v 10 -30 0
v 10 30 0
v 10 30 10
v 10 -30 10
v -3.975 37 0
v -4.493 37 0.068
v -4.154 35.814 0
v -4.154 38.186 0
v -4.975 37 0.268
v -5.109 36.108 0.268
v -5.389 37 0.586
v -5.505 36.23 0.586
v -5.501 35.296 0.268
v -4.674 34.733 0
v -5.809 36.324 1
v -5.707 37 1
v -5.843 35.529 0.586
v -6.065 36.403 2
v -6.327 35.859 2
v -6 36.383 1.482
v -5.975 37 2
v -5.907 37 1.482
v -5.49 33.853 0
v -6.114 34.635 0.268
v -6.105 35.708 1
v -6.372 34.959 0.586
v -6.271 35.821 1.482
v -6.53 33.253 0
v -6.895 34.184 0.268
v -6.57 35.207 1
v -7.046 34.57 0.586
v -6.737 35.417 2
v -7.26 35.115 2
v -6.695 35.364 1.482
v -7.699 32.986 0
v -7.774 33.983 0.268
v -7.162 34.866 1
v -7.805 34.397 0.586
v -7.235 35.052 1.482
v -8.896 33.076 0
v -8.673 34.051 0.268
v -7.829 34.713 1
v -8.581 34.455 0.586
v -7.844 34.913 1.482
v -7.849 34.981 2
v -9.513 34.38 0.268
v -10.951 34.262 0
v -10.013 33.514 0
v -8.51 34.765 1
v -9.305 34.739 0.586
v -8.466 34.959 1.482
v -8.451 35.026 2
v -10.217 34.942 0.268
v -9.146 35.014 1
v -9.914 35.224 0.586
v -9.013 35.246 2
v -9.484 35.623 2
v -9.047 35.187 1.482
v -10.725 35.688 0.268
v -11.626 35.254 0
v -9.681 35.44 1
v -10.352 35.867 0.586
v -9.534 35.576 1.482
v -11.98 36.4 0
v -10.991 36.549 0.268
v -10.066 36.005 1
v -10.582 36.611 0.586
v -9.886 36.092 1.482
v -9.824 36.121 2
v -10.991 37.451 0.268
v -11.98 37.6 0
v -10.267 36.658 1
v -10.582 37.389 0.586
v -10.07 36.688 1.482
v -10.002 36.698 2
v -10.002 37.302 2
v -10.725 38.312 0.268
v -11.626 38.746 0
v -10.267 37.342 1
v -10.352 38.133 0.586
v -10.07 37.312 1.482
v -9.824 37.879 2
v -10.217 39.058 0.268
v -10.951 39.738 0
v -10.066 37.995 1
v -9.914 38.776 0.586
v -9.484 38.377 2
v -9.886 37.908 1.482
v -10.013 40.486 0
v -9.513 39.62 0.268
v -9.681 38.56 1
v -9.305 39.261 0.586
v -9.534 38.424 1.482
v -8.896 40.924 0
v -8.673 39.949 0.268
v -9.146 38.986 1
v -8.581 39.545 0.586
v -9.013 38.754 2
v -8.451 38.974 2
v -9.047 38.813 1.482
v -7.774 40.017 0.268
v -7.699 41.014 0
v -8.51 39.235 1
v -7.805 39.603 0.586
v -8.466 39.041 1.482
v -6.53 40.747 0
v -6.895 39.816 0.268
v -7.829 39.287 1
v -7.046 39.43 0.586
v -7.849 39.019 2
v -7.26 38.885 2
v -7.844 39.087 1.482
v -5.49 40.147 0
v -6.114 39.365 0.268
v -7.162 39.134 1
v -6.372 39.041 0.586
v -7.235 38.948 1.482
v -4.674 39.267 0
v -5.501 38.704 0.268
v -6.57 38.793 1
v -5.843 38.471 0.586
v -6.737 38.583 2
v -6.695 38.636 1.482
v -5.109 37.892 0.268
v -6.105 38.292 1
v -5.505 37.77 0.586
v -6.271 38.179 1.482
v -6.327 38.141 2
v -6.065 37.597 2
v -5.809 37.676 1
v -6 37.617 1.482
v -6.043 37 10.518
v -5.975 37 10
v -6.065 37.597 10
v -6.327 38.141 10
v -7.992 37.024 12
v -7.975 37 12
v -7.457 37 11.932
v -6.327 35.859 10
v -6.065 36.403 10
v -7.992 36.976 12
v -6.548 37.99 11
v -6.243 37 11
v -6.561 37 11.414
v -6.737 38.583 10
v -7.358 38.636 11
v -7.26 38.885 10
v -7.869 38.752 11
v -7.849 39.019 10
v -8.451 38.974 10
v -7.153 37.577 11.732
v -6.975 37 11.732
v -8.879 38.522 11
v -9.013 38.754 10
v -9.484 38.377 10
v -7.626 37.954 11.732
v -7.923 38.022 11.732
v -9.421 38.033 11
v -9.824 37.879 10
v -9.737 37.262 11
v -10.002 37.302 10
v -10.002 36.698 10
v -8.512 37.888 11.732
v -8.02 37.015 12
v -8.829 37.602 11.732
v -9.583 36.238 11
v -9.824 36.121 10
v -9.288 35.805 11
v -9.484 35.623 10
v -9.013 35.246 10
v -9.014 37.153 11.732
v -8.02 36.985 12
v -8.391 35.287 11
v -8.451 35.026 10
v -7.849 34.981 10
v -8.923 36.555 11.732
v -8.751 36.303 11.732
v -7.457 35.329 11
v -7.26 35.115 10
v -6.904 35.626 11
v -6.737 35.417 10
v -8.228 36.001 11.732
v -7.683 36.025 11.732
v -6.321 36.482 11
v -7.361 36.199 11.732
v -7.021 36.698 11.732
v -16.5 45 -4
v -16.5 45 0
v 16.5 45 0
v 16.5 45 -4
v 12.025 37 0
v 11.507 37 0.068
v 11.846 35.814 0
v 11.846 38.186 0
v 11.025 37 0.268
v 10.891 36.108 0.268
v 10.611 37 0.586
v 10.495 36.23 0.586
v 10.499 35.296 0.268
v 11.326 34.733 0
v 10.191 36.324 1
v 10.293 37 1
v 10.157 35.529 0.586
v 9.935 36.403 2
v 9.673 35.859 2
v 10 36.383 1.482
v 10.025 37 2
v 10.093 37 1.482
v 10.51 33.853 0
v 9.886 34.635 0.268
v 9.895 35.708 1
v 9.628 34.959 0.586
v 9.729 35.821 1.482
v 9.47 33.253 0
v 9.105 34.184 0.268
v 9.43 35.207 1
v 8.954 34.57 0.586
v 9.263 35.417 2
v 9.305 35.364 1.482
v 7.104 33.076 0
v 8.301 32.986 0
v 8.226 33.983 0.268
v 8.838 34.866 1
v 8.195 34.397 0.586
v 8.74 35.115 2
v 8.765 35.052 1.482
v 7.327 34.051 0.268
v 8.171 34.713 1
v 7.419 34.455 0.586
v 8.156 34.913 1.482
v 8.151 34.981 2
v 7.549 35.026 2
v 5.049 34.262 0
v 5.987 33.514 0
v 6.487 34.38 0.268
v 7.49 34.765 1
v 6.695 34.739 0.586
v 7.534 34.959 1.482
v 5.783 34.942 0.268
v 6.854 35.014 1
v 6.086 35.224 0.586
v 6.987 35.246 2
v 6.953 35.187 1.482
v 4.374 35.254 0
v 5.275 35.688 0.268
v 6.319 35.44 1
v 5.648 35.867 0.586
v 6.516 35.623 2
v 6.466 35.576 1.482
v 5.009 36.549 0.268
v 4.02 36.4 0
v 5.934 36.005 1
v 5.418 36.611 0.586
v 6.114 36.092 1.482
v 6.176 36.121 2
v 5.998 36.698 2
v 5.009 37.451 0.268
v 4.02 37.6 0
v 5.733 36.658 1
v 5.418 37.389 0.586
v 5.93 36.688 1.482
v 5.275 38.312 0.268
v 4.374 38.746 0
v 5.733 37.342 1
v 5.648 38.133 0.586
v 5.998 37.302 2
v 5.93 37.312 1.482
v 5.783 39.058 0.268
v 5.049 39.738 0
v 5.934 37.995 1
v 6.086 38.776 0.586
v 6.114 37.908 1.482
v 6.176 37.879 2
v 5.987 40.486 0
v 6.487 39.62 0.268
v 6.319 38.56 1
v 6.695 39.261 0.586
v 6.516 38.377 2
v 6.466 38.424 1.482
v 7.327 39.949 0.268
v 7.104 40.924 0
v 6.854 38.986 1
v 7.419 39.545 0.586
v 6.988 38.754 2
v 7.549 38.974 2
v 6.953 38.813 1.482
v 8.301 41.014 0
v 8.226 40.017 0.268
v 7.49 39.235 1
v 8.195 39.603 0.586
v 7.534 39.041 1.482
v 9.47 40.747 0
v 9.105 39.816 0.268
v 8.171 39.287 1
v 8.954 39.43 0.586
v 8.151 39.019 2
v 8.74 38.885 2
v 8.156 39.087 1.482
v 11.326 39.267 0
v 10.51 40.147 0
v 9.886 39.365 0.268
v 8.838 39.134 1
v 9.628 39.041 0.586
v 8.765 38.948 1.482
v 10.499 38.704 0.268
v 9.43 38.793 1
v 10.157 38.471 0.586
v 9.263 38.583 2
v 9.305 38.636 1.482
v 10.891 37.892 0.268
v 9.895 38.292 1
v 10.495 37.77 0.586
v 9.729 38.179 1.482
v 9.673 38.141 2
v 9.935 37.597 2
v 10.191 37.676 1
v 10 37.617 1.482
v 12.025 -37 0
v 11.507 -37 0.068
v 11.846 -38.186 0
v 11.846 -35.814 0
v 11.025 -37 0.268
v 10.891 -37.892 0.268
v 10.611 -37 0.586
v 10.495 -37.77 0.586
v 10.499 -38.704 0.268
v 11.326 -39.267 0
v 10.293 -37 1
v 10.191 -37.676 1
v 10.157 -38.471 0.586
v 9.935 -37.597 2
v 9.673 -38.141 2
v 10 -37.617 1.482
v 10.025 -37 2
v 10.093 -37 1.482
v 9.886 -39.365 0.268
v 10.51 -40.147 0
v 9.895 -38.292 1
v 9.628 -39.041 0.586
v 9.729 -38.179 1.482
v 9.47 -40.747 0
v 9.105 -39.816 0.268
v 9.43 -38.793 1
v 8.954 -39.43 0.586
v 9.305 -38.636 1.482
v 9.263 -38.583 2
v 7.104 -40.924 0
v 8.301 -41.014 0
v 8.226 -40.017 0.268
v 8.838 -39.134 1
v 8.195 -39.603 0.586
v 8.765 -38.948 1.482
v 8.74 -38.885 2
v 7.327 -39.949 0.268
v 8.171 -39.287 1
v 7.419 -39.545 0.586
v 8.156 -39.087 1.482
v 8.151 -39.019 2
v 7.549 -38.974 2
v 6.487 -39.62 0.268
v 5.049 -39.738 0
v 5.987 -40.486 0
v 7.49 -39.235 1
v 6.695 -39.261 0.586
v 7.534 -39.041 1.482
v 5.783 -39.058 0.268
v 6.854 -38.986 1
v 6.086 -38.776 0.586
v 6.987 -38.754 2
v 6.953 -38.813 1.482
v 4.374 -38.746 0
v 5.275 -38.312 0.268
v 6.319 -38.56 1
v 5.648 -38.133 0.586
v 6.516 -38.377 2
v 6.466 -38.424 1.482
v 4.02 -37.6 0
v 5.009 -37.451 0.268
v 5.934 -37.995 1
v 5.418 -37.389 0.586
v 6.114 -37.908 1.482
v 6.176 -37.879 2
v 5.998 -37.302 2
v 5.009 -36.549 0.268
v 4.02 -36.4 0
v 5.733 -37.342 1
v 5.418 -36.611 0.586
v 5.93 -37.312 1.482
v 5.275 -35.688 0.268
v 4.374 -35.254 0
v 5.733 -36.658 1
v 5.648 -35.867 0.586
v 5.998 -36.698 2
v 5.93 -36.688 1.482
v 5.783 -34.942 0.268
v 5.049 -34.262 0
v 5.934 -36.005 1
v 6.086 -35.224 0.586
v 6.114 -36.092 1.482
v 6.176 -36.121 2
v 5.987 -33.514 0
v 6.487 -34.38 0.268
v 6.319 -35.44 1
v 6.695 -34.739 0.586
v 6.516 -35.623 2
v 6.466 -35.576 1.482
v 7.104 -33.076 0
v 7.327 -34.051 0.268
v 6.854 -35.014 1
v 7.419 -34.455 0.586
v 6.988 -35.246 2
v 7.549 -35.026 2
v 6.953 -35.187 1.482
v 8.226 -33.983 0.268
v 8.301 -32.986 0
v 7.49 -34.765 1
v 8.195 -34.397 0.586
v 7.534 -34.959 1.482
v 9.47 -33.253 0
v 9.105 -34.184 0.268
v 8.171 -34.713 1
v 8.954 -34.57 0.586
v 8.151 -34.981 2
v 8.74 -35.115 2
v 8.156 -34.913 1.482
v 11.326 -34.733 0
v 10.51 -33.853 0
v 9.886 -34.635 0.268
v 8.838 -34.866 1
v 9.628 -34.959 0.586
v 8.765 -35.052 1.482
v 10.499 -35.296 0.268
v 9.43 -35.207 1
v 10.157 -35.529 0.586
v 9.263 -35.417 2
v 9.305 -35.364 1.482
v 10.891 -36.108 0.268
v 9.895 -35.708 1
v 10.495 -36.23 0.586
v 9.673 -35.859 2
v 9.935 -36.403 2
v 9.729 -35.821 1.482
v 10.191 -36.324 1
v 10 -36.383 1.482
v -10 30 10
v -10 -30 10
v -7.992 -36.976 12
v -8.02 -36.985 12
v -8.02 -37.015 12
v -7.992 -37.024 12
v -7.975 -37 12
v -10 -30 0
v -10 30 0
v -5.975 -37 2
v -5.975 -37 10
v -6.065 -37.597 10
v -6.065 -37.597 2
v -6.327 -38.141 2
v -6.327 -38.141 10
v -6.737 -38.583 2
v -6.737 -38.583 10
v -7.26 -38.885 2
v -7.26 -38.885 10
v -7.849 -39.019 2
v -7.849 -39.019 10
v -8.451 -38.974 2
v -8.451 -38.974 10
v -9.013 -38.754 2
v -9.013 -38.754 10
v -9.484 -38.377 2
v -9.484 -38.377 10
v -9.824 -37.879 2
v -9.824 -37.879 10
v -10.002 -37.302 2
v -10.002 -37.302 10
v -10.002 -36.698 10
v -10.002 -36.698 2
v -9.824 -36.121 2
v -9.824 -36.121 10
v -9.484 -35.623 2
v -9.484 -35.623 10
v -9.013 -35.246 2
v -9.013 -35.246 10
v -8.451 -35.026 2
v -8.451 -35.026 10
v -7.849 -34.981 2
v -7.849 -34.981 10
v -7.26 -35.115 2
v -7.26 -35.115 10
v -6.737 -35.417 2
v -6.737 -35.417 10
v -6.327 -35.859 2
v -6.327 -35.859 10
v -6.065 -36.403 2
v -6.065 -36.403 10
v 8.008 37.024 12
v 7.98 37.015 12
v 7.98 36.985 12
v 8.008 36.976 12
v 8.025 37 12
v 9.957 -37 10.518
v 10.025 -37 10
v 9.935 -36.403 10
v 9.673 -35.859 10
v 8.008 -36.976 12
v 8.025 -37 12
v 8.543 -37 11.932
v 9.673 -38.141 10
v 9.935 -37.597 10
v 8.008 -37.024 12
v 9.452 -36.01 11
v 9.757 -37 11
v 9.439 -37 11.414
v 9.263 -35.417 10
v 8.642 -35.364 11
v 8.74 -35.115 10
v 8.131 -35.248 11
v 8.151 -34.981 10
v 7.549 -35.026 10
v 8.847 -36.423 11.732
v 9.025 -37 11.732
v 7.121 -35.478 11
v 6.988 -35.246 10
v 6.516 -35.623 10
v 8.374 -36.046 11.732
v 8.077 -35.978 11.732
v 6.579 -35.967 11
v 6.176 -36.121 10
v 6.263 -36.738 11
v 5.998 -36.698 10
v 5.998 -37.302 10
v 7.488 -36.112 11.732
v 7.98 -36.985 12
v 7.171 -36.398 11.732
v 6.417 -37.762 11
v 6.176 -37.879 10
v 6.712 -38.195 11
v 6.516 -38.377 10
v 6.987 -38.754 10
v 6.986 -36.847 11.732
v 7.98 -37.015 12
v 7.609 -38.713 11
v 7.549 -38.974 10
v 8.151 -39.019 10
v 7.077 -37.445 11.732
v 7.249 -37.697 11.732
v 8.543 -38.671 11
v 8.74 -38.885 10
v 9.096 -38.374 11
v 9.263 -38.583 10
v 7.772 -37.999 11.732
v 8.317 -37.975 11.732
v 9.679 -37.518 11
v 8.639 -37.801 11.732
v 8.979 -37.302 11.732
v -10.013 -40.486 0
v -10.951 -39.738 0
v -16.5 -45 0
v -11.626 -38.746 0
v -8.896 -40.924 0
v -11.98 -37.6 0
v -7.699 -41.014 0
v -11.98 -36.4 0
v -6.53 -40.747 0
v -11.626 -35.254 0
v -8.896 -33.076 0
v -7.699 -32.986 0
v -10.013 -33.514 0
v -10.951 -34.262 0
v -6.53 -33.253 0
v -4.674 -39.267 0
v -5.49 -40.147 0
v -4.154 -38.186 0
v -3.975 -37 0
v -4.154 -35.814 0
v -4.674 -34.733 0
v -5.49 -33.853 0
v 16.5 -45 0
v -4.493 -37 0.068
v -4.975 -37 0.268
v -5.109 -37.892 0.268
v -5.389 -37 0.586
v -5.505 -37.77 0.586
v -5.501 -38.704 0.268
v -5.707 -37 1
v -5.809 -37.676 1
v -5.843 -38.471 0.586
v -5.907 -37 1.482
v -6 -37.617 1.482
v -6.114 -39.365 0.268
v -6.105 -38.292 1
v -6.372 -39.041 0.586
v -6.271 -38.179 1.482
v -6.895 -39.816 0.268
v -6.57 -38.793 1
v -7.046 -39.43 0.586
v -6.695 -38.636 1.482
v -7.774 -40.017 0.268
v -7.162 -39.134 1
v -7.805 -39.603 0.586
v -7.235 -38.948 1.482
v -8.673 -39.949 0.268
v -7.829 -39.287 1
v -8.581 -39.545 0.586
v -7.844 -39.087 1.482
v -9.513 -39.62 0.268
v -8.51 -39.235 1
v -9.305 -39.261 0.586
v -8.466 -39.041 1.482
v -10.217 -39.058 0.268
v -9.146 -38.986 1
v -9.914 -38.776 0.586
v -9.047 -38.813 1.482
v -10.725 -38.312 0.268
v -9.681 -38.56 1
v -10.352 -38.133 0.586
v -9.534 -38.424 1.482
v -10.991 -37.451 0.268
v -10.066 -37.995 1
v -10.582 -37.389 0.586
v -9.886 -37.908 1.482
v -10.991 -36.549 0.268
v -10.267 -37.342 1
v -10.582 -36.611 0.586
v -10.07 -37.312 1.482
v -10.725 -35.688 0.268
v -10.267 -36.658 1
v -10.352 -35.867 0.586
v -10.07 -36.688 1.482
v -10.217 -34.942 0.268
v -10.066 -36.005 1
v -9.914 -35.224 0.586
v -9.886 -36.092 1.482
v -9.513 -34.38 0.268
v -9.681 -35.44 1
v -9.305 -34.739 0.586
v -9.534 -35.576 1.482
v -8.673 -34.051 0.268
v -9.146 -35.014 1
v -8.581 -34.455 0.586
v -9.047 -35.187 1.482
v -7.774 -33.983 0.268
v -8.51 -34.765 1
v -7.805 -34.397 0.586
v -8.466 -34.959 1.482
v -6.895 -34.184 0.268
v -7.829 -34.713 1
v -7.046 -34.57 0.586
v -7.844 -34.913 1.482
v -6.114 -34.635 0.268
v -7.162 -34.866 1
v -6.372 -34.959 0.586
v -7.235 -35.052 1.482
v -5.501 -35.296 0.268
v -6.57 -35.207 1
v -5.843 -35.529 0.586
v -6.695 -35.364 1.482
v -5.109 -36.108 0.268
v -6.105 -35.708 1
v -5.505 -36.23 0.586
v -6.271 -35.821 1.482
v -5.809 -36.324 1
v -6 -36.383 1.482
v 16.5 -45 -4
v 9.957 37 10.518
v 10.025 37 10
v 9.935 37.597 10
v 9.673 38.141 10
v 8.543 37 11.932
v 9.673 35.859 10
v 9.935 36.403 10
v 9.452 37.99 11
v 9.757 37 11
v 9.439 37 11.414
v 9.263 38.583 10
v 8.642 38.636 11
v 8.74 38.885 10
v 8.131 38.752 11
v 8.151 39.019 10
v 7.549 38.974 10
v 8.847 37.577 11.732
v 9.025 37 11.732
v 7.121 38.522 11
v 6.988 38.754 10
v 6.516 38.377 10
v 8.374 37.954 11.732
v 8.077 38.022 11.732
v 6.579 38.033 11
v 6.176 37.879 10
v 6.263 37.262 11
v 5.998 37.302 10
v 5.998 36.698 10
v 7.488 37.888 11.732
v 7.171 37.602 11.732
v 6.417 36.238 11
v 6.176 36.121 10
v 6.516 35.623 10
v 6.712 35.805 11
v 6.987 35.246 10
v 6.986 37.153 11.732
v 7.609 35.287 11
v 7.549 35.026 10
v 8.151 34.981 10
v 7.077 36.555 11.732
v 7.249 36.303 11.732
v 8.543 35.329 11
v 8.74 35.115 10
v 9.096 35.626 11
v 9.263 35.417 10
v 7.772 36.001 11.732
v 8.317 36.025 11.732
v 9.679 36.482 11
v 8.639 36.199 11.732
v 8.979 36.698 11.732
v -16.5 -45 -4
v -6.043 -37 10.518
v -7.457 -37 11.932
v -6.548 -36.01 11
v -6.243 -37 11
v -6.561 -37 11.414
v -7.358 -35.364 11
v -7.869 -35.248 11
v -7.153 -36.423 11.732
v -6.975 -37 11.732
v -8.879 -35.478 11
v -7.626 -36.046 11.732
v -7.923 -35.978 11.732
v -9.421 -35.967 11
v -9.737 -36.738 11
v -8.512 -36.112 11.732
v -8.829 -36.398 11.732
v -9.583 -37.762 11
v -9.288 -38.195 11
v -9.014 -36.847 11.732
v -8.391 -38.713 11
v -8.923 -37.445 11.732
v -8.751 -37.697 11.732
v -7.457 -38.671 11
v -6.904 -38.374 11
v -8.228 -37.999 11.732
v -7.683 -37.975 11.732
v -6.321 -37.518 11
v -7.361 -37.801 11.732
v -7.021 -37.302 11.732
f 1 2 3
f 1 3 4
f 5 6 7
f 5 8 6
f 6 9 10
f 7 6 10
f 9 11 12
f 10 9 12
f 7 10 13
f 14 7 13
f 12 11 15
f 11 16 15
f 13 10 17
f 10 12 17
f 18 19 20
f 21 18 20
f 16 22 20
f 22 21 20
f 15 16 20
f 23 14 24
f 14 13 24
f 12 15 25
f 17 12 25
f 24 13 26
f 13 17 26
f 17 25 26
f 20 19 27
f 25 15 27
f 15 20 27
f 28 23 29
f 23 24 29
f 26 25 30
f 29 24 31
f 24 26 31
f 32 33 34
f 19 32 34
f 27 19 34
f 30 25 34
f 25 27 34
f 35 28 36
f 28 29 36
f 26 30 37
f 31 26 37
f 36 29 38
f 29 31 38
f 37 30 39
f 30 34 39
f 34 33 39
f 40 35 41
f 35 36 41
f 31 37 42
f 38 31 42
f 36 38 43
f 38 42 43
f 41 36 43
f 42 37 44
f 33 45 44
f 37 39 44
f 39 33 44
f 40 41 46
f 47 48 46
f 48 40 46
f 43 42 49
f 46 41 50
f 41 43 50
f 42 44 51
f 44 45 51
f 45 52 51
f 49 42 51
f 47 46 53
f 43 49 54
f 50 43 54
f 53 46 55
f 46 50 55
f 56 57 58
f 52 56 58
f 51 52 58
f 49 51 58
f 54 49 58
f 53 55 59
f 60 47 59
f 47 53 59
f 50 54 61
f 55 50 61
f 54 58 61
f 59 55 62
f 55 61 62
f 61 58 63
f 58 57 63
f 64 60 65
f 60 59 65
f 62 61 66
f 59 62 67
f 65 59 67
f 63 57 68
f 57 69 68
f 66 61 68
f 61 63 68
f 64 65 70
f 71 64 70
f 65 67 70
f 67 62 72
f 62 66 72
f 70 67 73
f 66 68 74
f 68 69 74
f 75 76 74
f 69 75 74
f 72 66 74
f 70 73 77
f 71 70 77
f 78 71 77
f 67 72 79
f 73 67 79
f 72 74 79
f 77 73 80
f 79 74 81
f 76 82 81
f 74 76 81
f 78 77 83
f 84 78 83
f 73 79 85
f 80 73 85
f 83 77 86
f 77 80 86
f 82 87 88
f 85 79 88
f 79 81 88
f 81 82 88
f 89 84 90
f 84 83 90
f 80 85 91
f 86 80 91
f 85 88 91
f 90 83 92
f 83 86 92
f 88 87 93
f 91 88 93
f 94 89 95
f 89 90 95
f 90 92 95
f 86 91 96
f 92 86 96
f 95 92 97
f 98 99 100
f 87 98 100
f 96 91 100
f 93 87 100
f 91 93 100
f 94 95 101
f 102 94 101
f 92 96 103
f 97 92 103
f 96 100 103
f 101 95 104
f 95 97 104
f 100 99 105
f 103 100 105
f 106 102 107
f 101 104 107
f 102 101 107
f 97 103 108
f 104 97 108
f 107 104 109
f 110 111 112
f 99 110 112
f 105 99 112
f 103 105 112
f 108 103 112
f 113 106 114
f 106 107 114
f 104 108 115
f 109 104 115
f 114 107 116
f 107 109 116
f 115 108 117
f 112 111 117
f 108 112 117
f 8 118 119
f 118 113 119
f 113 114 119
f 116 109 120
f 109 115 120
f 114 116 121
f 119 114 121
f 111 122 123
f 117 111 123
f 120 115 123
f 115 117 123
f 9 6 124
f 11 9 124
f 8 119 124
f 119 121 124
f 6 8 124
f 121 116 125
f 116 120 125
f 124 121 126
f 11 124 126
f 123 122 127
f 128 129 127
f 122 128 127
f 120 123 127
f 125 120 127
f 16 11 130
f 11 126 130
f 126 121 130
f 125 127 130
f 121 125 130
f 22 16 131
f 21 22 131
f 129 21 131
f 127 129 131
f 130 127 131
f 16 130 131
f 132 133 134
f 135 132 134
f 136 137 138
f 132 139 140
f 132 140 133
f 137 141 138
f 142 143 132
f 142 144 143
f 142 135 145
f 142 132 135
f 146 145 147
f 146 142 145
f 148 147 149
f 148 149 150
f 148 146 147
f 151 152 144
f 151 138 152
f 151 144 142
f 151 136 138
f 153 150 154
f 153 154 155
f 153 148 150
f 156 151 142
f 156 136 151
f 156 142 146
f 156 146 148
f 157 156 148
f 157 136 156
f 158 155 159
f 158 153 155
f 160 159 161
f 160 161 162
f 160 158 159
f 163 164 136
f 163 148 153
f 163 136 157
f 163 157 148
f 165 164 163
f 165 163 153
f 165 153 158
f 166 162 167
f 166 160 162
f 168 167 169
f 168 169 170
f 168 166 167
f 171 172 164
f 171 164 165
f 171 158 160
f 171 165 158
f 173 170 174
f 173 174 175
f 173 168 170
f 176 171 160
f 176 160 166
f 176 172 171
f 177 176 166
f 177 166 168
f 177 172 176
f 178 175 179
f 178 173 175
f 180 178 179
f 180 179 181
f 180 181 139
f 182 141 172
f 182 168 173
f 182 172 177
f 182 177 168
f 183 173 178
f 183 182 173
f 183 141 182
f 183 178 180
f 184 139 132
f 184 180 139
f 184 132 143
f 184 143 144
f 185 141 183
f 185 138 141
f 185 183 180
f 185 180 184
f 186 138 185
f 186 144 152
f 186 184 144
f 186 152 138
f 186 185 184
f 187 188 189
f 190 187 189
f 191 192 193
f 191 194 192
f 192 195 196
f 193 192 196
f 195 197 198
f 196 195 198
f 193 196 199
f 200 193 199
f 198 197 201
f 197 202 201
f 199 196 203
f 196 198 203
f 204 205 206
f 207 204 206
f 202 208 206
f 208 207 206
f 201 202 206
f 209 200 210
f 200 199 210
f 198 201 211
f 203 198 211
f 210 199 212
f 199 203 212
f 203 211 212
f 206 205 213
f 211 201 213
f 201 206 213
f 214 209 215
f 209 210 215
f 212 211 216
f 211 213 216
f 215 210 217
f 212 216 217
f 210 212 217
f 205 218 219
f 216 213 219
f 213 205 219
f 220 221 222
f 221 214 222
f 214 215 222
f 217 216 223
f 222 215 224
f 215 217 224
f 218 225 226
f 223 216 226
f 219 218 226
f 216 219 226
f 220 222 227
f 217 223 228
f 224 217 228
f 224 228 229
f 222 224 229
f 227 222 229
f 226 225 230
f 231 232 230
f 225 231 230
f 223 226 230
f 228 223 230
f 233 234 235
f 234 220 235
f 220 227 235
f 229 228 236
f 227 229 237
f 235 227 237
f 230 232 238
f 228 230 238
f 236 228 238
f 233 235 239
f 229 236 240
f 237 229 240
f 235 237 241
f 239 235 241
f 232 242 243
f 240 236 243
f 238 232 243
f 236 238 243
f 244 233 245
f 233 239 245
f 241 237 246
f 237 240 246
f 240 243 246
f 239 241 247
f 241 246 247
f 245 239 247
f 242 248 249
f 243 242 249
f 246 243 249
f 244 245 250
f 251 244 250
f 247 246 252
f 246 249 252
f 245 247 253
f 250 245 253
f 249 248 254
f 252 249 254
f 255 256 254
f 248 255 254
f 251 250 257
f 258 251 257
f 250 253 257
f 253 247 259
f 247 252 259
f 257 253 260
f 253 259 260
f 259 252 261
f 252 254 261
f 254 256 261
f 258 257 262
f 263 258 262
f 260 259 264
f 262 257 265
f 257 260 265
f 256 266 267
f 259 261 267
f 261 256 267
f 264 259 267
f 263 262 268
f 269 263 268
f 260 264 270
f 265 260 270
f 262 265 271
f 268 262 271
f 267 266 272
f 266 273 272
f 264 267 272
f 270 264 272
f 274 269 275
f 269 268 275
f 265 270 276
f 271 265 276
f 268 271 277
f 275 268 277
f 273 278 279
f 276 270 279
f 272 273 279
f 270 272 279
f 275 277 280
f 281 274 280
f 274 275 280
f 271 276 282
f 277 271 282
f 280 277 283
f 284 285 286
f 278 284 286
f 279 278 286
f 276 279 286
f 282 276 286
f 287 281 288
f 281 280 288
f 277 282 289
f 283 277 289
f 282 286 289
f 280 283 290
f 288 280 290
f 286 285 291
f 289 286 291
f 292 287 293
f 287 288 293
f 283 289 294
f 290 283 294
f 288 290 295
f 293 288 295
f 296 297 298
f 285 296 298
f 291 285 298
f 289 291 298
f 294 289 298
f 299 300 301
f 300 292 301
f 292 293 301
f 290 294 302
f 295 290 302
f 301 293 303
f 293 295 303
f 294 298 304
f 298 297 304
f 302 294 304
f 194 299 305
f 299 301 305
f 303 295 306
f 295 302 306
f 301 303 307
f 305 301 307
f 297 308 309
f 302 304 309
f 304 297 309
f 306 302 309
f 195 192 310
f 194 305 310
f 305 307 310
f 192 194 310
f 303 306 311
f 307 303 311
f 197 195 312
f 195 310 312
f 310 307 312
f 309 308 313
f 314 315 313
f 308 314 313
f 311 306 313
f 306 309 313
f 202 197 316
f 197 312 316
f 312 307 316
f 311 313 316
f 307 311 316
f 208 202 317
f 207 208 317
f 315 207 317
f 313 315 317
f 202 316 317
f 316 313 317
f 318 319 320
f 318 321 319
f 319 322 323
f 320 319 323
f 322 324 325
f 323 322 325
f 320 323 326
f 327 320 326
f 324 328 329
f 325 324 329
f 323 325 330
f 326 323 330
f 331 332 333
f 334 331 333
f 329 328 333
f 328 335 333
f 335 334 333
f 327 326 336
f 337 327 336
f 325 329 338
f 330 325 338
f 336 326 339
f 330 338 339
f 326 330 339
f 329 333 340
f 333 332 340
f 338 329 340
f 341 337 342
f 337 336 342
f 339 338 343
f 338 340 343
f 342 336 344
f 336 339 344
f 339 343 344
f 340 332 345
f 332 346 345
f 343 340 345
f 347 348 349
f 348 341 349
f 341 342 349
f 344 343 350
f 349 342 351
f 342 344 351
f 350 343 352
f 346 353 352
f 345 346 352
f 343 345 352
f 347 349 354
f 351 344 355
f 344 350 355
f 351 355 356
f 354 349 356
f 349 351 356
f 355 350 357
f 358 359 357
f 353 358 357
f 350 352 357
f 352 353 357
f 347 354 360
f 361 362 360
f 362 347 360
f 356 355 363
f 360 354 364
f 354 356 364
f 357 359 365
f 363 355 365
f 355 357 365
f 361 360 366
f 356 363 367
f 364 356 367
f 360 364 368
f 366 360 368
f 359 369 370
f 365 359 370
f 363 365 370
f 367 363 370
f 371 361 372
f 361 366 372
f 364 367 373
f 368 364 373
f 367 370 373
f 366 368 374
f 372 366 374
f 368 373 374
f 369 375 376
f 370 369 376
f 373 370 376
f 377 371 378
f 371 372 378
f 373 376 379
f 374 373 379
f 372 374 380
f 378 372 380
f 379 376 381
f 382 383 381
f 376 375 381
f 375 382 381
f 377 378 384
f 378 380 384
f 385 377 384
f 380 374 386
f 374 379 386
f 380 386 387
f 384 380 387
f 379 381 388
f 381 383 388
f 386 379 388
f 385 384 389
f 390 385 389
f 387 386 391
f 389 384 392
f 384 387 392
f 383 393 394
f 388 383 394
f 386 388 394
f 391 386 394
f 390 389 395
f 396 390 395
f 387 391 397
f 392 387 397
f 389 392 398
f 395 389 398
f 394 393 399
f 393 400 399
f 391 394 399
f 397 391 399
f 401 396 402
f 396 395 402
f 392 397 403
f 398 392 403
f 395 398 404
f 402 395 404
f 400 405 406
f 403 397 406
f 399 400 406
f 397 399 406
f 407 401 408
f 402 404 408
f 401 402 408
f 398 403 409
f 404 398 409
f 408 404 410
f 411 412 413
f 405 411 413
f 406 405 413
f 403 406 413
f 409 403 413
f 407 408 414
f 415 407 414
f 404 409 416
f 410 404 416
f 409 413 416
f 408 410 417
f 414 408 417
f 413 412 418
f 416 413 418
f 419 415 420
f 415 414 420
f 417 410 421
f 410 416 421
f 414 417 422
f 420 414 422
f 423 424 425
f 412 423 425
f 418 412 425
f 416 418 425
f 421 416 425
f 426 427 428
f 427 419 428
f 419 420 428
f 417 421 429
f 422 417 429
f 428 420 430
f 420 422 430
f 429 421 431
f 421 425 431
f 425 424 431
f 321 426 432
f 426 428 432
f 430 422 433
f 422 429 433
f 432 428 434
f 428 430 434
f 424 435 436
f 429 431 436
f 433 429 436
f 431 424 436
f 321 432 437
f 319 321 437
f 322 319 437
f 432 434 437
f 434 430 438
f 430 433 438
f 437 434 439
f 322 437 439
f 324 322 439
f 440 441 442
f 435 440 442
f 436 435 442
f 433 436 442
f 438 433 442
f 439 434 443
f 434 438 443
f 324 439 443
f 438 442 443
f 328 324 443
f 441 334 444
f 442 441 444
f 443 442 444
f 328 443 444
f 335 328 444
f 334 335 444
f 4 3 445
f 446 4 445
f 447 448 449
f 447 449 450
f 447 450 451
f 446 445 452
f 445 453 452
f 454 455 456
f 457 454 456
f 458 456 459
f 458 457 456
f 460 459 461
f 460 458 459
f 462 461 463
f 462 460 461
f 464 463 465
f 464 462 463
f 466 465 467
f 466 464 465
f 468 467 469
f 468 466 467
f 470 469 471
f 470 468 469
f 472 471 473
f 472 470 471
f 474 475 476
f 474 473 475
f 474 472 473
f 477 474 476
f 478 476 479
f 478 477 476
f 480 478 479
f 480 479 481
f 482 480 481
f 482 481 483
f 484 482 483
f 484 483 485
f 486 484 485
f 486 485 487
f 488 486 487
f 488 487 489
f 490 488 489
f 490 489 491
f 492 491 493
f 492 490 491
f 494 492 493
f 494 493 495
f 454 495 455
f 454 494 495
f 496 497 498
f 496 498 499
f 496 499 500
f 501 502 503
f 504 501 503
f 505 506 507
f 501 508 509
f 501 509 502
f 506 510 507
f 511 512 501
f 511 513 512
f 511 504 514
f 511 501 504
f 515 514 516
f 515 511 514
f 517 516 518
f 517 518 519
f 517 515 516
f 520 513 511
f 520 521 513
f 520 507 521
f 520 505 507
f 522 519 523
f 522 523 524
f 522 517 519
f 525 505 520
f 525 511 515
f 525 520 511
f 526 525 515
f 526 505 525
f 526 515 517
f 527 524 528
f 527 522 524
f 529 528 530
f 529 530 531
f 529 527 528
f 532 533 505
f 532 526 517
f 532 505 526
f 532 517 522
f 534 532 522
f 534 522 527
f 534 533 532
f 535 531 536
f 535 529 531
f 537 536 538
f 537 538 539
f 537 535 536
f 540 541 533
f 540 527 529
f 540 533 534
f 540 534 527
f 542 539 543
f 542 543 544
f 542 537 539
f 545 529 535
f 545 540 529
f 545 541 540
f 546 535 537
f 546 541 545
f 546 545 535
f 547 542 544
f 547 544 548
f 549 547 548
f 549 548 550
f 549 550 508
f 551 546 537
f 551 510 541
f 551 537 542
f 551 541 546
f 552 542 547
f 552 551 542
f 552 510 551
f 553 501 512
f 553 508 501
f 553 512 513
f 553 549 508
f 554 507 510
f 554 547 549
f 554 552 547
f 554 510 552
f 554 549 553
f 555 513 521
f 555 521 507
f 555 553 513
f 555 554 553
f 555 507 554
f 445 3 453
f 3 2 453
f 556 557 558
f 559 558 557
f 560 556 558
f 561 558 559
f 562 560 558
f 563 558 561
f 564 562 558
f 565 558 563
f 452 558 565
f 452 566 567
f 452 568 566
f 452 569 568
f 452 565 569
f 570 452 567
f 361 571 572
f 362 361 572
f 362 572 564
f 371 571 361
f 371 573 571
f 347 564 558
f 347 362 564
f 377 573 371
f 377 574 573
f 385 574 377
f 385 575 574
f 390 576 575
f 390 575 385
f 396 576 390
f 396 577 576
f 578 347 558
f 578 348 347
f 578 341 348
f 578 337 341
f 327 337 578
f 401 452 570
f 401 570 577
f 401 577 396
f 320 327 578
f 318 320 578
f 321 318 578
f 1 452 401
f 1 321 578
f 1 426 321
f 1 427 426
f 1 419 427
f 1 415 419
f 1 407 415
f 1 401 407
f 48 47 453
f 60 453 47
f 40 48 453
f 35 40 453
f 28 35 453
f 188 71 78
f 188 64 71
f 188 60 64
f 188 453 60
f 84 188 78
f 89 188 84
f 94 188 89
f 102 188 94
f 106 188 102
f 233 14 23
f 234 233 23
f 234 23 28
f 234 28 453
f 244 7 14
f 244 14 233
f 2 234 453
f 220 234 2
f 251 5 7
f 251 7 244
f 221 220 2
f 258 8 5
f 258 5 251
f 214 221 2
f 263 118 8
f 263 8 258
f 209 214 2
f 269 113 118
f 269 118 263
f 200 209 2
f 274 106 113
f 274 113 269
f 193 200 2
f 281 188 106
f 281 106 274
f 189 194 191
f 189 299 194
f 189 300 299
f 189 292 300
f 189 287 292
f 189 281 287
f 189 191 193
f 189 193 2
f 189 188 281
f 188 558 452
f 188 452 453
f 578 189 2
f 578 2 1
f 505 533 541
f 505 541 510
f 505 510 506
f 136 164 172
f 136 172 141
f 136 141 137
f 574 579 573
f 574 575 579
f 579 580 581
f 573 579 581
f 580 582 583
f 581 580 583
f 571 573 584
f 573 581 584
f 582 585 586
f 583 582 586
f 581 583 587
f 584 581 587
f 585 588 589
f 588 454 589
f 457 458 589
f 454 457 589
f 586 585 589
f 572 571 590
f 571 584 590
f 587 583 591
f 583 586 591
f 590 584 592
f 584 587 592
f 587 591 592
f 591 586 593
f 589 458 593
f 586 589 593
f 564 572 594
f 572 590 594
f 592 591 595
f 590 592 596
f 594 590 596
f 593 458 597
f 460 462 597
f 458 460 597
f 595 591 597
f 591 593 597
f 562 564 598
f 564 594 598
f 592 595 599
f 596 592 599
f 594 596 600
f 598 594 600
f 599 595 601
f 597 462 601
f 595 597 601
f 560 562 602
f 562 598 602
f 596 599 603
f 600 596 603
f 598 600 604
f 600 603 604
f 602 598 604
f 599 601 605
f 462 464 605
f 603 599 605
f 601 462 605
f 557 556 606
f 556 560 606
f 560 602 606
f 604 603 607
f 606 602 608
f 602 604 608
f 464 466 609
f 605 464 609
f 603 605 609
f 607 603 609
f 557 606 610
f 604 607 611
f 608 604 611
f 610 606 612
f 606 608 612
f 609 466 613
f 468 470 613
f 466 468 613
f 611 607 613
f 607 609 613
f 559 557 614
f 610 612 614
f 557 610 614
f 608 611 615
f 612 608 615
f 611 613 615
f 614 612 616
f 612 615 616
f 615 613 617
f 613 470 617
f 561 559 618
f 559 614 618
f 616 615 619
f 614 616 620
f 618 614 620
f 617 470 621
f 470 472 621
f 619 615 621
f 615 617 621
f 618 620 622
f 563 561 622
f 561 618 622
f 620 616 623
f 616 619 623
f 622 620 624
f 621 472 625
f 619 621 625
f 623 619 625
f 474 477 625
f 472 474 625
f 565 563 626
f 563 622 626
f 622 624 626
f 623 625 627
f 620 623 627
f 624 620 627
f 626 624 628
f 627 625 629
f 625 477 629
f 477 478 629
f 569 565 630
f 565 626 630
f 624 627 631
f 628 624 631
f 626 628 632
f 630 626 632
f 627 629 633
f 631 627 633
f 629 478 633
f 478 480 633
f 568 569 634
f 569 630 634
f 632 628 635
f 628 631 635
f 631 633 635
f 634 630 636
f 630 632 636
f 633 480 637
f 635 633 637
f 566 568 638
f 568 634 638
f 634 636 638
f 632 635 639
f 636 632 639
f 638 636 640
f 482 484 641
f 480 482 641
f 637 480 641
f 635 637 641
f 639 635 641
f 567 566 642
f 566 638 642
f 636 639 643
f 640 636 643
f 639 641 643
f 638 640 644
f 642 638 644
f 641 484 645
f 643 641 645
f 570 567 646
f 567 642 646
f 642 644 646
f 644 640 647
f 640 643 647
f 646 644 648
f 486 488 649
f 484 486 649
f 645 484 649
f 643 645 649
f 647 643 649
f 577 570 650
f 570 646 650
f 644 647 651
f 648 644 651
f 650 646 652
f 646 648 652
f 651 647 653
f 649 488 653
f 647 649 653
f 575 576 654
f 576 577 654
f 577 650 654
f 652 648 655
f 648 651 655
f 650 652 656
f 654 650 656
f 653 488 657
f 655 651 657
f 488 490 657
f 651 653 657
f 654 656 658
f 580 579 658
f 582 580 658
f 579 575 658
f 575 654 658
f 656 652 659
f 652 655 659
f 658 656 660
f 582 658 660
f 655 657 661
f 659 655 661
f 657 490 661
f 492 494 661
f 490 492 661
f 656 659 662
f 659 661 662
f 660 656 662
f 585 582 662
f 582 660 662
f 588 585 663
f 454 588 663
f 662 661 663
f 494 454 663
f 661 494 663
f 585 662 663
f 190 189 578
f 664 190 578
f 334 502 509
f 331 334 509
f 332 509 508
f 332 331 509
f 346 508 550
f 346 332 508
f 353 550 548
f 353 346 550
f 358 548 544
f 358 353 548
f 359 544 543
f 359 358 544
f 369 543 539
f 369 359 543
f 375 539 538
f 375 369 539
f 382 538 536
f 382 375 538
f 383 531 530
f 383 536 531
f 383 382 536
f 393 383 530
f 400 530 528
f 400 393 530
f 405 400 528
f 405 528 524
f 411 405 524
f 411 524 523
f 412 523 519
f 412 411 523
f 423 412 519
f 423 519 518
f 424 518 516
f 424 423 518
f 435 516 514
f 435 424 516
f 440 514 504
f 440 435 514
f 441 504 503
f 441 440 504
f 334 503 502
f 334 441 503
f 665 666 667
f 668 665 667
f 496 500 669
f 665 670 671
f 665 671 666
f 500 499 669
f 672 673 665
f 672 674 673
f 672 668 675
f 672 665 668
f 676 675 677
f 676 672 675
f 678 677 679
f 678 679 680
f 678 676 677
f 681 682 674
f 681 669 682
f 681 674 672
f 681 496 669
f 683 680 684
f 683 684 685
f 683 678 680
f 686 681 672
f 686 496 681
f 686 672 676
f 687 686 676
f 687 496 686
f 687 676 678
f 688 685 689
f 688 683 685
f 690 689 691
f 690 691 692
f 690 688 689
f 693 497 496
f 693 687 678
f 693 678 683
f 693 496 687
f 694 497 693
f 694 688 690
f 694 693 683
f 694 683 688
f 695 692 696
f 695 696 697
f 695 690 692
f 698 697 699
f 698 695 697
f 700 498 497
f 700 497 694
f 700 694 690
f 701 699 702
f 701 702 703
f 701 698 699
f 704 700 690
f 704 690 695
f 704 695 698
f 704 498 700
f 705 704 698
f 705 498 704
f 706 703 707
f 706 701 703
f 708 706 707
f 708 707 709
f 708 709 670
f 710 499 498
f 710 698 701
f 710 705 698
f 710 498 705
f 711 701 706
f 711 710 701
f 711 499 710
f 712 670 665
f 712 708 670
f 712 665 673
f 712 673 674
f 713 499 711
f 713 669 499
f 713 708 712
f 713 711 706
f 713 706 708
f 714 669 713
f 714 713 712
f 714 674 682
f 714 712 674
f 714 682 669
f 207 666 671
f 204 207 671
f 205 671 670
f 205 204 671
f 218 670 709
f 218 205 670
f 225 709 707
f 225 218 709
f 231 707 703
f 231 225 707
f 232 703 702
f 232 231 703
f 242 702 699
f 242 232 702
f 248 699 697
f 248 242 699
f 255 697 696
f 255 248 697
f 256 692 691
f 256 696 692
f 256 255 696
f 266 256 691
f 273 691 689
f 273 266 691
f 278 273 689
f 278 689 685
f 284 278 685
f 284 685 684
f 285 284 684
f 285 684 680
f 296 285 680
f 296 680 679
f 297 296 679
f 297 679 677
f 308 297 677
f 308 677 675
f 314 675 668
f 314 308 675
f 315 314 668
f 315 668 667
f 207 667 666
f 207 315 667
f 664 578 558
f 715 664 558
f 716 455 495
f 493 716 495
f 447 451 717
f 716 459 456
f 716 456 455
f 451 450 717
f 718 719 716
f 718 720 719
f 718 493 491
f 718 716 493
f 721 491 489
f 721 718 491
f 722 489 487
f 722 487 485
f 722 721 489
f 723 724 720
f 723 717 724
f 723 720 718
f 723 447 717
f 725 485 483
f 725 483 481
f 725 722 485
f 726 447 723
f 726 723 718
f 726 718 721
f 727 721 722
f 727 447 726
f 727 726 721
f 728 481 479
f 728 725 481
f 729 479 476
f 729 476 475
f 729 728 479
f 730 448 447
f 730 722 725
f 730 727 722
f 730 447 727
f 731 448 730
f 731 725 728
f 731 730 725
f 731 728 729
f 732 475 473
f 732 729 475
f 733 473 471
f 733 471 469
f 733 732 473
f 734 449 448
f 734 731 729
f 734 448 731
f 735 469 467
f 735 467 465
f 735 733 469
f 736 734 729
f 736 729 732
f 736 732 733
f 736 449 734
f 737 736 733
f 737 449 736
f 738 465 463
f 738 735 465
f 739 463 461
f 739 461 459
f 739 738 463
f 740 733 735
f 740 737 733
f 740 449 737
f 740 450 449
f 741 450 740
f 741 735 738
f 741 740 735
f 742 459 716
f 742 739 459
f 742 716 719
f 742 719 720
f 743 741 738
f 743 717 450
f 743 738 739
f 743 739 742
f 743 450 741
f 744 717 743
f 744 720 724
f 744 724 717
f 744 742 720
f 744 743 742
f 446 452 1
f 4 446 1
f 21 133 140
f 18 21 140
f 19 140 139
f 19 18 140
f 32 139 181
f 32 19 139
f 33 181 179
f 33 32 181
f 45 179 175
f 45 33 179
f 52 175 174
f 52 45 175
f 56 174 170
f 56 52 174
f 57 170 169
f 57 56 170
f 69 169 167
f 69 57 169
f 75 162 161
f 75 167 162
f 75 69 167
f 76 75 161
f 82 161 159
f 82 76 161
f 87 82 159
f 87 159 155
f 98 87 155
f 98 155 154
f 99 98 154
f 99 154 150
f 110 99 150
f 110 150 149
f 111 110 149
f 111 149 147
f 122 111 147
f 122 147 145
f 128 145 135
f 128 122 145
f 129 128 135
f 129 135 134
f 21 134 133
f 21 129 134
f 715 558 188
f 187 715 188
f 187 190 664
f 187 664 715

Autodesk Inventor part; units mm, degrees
ref_plane "YZ Plane" through (0, 0, 0) normal (1, 0, 0) x (0, 1, 0)
ref_plane "XZ Plane" through (0, 0, 0) normal (0, 1, 0) x (-1, 0, 0)
ref_plane "XY Plane" through (0, 0, 0) normal (0, 0, 1) x (1, 0, 0)
sketch "Sketch1" plane through (0, 0, 0) normal (0, 0, 1) x (1, 0, 0)
  line L0 (-13.5, 42) -> (13.5, 42) construction
  line L1 (13.5, 42) -> (13.5, -42) construction
  line L2 (13.5, -42) -> (-13.5, -42) construction
  line L3 (-13.5, -42) -> (-13.5, 42) construction
  line L4 (-10, 30) -> (10, 30)
  line L5 (10, 30) -> (10, -30)
  line L6 (10, -30) -> (-10, -30)
  line L7 (-10, -30) -> (-10, 30)
  circle A0 centre (-8, 37) radius 2.025
  circle A1 centre (8, 37) radius 2.025
  circle A2 centre (8, -37) radius 2.025
  circle A3 centre (-8, -37) radius 2.025
  line L8 (-16.5, 45) -> (16.5, 45)
  line L9 (16.5, 45) -> (16.5, -45)
  line L10 (16.5, -45) -> (-16.5, -45)
  line L11 (-16.5, -45) -> (-16.5, 45)
  line L12 (-23.1, 0) -> (23.1, 0) projected
  point P0 (0, 0)
  dimension "d0" = 27
  dimension "d8" = 4.05
  dimension "d9" = 5
  dimension "d10" = 5.5
  dimension "d11" = 4.05
  dimension "d12" = 5.5
  dimension "d13" = 4.05
  dimension "d14" = 5
  dimension "d15" = 4.05
  dimension "d17" = 33
  dimension "d19" = 16.5
  dimension "d29" = 5.5
  dimension "d31" = 5
  dimension "d66" = 15
  dimension "d68" = 8
  dimension "d69" = 8
  dimension "d71" = 60
  dimension "d72" = 15
  dimension "d73" = 8
  dimension "d76" = 30
  dimension "d77" = 20
  dimension "d79" = 8
extrude "Extrusion1" add sketch "Sketch1" along normal blind 12 contours A0 | A1 | A2 | A3
extrude "Extrusion2" add sketch "Sketch1" against normal blind 4 contours L7 L12 L11 L8 L9 L5 L4 | L4 L5 L12 L7 | L12 L5 L6 L7 | L7 L6 L5 L12 L9 L10 L11 | A0 | A1 | A2 | A3
extrude "Extrusion3" [suppressed]
sketch "Sketch2" plane through (0, 0, 12) normal (0, 0, 1) x (1, 0, 0)
  line L0 (-10, -30) -> (10, -30) projected
  line L1 (10, -30) -> (10, 30) projected
  line L2 (10, 30) -> (-10, 30) projected
  line L3 (-10, 30) -> (-10, -30) projected
  circle A0 centre (-8, 37) radius 2.025 projected
  circle A1 centre (8, 37) radius 2.025 projected
  circle A2 centre (8, -37) radius 2.025 projected
  circle A3 centre (-8, -37) radius 2.025 projected
  point P0 (0, 0)
extrude "Extrusion4" [suppressed]
sketch "Sketch3" plane through (0, 0, -4) normal (0, 0, -1) x (-1, 0, 0)
  line L0 (31.5, 60) -> (-31.5, 60)
  line L1 (-31.5, 60) -> (-31.5, -60)
  line L2 (-31.5, -60) -> (31.5, -60)
  line L3 (31.5, -60) -> (31.5, 60)
  line L4 (16.5, -45) -> (16.5, 45) projected
  line L5 (-16.5, 45) -> (-16.5, -45) projected
  line L6 (-16.5, -45) -> (16.5, -45) projected
  line L7 (16.5, 45) -> (-16.5, 45) projected
  point P0 (0, 0)
  dimension "d32" = 15
  dimension "d33" = 15
  dimension "d34" = 15
  dimension "d35" = 15
extrude "Extrusion5" [suppressed]
sketch "Sketch4" plane through (-31.5, -38, 0) normal (0, 0, 1) x (1, 0, 0)
  line L0 (0, 0) -> (0, 76) projected
  line L1 (0, 76) -> (63, 76) projected
  line L2 (0, 0) -> (63, 0)
  line L3 (63, 0) -> (63, 76)
  line L4 (63, 76) -> (0, 76)
  line L5 (0, 76) -> (0, 0)
  line L6 (60.5, 73.5) -> (2.5, 73.5)
  line L7 (2.5, 73.5) -> (2.5, 2.5)
  line L8 (2.5, 2.5) -> (60.5, 2.5)
  line L9 (60.5, 2.5) -> (60.5, 73.5)
  point P0 (31.5, 38)
  dimension "d38" = 2.5
  dimension "d39" = 2.5
  dimension "d40" = 2.5
  dimension "d41" = 2.5
extrude "Extrusion6" [suppressed]
sketch "Sketch6" plane through (0, 0, -4) normal (0, 0, -1) x (-1, 0, 0)
  line L0 (-10, 30) -> (-10, -30) projected
  line L1 (10, -30) -> (-10, -30) projected
  line L2 (-10, 30) -> (10, 30)
  line L3 (10, 30) -> (10, -30)
  line L4 (10, -30) -> (-10, -30)
  line L5 (-10, -30) -> (-10, 30)
  point P0 (0, 0)
extrude "Extrusion7" add sketch "Sketch6" against normal blind 14
sketch "Sketch7" plane through (0, 0, -4) normal (0, 0, -1) x (-1, 0, 0)
  circle A0 centre (8, -37) radius 2.025 projected
  circle A1 centre (8, -37) radius 2.1
  circle A2 centre (-8, -37) radius 2.025 projected
  circle A3 centre (-8, -37) radius 2.1
  circle A4 centre (-8, 37) radius 2.025 projected
  circle A5 centre (-8, 37) radius 2.1
  circle A6 centre (8, 37) radius 2.025 projected
  circle A7 centre (8, 37) radius 2.1
  point P0 (0, 0)
  dimension "d58" = 4.2
  dimension "d59" = 4.2
  dimension "d60" = 4.2
  dimension "d61" = 4.2
extrude "Extrusion8" [suppressed]
fillet "Fillet1" [suppressed]
fillet "Fillet2" [suppressed]
fillet "Fillet3" radius 2 8 edges at (-10.025, -37, 12) (5.975, -37, 12) (5.975, 37, 12) (-10.025, 37, 12) (5.975, -37, 0) (-10.025, -37, 0) (5.975, 37, 0) (-10.025, 37, 0)
sketch "Sketch8" plane through (0, 0, 0) normal (0, 0, 1) x (1, 0, 0)
  point P0 (0, 0)
properties part number "Long PDMS Chamber-Mold"
